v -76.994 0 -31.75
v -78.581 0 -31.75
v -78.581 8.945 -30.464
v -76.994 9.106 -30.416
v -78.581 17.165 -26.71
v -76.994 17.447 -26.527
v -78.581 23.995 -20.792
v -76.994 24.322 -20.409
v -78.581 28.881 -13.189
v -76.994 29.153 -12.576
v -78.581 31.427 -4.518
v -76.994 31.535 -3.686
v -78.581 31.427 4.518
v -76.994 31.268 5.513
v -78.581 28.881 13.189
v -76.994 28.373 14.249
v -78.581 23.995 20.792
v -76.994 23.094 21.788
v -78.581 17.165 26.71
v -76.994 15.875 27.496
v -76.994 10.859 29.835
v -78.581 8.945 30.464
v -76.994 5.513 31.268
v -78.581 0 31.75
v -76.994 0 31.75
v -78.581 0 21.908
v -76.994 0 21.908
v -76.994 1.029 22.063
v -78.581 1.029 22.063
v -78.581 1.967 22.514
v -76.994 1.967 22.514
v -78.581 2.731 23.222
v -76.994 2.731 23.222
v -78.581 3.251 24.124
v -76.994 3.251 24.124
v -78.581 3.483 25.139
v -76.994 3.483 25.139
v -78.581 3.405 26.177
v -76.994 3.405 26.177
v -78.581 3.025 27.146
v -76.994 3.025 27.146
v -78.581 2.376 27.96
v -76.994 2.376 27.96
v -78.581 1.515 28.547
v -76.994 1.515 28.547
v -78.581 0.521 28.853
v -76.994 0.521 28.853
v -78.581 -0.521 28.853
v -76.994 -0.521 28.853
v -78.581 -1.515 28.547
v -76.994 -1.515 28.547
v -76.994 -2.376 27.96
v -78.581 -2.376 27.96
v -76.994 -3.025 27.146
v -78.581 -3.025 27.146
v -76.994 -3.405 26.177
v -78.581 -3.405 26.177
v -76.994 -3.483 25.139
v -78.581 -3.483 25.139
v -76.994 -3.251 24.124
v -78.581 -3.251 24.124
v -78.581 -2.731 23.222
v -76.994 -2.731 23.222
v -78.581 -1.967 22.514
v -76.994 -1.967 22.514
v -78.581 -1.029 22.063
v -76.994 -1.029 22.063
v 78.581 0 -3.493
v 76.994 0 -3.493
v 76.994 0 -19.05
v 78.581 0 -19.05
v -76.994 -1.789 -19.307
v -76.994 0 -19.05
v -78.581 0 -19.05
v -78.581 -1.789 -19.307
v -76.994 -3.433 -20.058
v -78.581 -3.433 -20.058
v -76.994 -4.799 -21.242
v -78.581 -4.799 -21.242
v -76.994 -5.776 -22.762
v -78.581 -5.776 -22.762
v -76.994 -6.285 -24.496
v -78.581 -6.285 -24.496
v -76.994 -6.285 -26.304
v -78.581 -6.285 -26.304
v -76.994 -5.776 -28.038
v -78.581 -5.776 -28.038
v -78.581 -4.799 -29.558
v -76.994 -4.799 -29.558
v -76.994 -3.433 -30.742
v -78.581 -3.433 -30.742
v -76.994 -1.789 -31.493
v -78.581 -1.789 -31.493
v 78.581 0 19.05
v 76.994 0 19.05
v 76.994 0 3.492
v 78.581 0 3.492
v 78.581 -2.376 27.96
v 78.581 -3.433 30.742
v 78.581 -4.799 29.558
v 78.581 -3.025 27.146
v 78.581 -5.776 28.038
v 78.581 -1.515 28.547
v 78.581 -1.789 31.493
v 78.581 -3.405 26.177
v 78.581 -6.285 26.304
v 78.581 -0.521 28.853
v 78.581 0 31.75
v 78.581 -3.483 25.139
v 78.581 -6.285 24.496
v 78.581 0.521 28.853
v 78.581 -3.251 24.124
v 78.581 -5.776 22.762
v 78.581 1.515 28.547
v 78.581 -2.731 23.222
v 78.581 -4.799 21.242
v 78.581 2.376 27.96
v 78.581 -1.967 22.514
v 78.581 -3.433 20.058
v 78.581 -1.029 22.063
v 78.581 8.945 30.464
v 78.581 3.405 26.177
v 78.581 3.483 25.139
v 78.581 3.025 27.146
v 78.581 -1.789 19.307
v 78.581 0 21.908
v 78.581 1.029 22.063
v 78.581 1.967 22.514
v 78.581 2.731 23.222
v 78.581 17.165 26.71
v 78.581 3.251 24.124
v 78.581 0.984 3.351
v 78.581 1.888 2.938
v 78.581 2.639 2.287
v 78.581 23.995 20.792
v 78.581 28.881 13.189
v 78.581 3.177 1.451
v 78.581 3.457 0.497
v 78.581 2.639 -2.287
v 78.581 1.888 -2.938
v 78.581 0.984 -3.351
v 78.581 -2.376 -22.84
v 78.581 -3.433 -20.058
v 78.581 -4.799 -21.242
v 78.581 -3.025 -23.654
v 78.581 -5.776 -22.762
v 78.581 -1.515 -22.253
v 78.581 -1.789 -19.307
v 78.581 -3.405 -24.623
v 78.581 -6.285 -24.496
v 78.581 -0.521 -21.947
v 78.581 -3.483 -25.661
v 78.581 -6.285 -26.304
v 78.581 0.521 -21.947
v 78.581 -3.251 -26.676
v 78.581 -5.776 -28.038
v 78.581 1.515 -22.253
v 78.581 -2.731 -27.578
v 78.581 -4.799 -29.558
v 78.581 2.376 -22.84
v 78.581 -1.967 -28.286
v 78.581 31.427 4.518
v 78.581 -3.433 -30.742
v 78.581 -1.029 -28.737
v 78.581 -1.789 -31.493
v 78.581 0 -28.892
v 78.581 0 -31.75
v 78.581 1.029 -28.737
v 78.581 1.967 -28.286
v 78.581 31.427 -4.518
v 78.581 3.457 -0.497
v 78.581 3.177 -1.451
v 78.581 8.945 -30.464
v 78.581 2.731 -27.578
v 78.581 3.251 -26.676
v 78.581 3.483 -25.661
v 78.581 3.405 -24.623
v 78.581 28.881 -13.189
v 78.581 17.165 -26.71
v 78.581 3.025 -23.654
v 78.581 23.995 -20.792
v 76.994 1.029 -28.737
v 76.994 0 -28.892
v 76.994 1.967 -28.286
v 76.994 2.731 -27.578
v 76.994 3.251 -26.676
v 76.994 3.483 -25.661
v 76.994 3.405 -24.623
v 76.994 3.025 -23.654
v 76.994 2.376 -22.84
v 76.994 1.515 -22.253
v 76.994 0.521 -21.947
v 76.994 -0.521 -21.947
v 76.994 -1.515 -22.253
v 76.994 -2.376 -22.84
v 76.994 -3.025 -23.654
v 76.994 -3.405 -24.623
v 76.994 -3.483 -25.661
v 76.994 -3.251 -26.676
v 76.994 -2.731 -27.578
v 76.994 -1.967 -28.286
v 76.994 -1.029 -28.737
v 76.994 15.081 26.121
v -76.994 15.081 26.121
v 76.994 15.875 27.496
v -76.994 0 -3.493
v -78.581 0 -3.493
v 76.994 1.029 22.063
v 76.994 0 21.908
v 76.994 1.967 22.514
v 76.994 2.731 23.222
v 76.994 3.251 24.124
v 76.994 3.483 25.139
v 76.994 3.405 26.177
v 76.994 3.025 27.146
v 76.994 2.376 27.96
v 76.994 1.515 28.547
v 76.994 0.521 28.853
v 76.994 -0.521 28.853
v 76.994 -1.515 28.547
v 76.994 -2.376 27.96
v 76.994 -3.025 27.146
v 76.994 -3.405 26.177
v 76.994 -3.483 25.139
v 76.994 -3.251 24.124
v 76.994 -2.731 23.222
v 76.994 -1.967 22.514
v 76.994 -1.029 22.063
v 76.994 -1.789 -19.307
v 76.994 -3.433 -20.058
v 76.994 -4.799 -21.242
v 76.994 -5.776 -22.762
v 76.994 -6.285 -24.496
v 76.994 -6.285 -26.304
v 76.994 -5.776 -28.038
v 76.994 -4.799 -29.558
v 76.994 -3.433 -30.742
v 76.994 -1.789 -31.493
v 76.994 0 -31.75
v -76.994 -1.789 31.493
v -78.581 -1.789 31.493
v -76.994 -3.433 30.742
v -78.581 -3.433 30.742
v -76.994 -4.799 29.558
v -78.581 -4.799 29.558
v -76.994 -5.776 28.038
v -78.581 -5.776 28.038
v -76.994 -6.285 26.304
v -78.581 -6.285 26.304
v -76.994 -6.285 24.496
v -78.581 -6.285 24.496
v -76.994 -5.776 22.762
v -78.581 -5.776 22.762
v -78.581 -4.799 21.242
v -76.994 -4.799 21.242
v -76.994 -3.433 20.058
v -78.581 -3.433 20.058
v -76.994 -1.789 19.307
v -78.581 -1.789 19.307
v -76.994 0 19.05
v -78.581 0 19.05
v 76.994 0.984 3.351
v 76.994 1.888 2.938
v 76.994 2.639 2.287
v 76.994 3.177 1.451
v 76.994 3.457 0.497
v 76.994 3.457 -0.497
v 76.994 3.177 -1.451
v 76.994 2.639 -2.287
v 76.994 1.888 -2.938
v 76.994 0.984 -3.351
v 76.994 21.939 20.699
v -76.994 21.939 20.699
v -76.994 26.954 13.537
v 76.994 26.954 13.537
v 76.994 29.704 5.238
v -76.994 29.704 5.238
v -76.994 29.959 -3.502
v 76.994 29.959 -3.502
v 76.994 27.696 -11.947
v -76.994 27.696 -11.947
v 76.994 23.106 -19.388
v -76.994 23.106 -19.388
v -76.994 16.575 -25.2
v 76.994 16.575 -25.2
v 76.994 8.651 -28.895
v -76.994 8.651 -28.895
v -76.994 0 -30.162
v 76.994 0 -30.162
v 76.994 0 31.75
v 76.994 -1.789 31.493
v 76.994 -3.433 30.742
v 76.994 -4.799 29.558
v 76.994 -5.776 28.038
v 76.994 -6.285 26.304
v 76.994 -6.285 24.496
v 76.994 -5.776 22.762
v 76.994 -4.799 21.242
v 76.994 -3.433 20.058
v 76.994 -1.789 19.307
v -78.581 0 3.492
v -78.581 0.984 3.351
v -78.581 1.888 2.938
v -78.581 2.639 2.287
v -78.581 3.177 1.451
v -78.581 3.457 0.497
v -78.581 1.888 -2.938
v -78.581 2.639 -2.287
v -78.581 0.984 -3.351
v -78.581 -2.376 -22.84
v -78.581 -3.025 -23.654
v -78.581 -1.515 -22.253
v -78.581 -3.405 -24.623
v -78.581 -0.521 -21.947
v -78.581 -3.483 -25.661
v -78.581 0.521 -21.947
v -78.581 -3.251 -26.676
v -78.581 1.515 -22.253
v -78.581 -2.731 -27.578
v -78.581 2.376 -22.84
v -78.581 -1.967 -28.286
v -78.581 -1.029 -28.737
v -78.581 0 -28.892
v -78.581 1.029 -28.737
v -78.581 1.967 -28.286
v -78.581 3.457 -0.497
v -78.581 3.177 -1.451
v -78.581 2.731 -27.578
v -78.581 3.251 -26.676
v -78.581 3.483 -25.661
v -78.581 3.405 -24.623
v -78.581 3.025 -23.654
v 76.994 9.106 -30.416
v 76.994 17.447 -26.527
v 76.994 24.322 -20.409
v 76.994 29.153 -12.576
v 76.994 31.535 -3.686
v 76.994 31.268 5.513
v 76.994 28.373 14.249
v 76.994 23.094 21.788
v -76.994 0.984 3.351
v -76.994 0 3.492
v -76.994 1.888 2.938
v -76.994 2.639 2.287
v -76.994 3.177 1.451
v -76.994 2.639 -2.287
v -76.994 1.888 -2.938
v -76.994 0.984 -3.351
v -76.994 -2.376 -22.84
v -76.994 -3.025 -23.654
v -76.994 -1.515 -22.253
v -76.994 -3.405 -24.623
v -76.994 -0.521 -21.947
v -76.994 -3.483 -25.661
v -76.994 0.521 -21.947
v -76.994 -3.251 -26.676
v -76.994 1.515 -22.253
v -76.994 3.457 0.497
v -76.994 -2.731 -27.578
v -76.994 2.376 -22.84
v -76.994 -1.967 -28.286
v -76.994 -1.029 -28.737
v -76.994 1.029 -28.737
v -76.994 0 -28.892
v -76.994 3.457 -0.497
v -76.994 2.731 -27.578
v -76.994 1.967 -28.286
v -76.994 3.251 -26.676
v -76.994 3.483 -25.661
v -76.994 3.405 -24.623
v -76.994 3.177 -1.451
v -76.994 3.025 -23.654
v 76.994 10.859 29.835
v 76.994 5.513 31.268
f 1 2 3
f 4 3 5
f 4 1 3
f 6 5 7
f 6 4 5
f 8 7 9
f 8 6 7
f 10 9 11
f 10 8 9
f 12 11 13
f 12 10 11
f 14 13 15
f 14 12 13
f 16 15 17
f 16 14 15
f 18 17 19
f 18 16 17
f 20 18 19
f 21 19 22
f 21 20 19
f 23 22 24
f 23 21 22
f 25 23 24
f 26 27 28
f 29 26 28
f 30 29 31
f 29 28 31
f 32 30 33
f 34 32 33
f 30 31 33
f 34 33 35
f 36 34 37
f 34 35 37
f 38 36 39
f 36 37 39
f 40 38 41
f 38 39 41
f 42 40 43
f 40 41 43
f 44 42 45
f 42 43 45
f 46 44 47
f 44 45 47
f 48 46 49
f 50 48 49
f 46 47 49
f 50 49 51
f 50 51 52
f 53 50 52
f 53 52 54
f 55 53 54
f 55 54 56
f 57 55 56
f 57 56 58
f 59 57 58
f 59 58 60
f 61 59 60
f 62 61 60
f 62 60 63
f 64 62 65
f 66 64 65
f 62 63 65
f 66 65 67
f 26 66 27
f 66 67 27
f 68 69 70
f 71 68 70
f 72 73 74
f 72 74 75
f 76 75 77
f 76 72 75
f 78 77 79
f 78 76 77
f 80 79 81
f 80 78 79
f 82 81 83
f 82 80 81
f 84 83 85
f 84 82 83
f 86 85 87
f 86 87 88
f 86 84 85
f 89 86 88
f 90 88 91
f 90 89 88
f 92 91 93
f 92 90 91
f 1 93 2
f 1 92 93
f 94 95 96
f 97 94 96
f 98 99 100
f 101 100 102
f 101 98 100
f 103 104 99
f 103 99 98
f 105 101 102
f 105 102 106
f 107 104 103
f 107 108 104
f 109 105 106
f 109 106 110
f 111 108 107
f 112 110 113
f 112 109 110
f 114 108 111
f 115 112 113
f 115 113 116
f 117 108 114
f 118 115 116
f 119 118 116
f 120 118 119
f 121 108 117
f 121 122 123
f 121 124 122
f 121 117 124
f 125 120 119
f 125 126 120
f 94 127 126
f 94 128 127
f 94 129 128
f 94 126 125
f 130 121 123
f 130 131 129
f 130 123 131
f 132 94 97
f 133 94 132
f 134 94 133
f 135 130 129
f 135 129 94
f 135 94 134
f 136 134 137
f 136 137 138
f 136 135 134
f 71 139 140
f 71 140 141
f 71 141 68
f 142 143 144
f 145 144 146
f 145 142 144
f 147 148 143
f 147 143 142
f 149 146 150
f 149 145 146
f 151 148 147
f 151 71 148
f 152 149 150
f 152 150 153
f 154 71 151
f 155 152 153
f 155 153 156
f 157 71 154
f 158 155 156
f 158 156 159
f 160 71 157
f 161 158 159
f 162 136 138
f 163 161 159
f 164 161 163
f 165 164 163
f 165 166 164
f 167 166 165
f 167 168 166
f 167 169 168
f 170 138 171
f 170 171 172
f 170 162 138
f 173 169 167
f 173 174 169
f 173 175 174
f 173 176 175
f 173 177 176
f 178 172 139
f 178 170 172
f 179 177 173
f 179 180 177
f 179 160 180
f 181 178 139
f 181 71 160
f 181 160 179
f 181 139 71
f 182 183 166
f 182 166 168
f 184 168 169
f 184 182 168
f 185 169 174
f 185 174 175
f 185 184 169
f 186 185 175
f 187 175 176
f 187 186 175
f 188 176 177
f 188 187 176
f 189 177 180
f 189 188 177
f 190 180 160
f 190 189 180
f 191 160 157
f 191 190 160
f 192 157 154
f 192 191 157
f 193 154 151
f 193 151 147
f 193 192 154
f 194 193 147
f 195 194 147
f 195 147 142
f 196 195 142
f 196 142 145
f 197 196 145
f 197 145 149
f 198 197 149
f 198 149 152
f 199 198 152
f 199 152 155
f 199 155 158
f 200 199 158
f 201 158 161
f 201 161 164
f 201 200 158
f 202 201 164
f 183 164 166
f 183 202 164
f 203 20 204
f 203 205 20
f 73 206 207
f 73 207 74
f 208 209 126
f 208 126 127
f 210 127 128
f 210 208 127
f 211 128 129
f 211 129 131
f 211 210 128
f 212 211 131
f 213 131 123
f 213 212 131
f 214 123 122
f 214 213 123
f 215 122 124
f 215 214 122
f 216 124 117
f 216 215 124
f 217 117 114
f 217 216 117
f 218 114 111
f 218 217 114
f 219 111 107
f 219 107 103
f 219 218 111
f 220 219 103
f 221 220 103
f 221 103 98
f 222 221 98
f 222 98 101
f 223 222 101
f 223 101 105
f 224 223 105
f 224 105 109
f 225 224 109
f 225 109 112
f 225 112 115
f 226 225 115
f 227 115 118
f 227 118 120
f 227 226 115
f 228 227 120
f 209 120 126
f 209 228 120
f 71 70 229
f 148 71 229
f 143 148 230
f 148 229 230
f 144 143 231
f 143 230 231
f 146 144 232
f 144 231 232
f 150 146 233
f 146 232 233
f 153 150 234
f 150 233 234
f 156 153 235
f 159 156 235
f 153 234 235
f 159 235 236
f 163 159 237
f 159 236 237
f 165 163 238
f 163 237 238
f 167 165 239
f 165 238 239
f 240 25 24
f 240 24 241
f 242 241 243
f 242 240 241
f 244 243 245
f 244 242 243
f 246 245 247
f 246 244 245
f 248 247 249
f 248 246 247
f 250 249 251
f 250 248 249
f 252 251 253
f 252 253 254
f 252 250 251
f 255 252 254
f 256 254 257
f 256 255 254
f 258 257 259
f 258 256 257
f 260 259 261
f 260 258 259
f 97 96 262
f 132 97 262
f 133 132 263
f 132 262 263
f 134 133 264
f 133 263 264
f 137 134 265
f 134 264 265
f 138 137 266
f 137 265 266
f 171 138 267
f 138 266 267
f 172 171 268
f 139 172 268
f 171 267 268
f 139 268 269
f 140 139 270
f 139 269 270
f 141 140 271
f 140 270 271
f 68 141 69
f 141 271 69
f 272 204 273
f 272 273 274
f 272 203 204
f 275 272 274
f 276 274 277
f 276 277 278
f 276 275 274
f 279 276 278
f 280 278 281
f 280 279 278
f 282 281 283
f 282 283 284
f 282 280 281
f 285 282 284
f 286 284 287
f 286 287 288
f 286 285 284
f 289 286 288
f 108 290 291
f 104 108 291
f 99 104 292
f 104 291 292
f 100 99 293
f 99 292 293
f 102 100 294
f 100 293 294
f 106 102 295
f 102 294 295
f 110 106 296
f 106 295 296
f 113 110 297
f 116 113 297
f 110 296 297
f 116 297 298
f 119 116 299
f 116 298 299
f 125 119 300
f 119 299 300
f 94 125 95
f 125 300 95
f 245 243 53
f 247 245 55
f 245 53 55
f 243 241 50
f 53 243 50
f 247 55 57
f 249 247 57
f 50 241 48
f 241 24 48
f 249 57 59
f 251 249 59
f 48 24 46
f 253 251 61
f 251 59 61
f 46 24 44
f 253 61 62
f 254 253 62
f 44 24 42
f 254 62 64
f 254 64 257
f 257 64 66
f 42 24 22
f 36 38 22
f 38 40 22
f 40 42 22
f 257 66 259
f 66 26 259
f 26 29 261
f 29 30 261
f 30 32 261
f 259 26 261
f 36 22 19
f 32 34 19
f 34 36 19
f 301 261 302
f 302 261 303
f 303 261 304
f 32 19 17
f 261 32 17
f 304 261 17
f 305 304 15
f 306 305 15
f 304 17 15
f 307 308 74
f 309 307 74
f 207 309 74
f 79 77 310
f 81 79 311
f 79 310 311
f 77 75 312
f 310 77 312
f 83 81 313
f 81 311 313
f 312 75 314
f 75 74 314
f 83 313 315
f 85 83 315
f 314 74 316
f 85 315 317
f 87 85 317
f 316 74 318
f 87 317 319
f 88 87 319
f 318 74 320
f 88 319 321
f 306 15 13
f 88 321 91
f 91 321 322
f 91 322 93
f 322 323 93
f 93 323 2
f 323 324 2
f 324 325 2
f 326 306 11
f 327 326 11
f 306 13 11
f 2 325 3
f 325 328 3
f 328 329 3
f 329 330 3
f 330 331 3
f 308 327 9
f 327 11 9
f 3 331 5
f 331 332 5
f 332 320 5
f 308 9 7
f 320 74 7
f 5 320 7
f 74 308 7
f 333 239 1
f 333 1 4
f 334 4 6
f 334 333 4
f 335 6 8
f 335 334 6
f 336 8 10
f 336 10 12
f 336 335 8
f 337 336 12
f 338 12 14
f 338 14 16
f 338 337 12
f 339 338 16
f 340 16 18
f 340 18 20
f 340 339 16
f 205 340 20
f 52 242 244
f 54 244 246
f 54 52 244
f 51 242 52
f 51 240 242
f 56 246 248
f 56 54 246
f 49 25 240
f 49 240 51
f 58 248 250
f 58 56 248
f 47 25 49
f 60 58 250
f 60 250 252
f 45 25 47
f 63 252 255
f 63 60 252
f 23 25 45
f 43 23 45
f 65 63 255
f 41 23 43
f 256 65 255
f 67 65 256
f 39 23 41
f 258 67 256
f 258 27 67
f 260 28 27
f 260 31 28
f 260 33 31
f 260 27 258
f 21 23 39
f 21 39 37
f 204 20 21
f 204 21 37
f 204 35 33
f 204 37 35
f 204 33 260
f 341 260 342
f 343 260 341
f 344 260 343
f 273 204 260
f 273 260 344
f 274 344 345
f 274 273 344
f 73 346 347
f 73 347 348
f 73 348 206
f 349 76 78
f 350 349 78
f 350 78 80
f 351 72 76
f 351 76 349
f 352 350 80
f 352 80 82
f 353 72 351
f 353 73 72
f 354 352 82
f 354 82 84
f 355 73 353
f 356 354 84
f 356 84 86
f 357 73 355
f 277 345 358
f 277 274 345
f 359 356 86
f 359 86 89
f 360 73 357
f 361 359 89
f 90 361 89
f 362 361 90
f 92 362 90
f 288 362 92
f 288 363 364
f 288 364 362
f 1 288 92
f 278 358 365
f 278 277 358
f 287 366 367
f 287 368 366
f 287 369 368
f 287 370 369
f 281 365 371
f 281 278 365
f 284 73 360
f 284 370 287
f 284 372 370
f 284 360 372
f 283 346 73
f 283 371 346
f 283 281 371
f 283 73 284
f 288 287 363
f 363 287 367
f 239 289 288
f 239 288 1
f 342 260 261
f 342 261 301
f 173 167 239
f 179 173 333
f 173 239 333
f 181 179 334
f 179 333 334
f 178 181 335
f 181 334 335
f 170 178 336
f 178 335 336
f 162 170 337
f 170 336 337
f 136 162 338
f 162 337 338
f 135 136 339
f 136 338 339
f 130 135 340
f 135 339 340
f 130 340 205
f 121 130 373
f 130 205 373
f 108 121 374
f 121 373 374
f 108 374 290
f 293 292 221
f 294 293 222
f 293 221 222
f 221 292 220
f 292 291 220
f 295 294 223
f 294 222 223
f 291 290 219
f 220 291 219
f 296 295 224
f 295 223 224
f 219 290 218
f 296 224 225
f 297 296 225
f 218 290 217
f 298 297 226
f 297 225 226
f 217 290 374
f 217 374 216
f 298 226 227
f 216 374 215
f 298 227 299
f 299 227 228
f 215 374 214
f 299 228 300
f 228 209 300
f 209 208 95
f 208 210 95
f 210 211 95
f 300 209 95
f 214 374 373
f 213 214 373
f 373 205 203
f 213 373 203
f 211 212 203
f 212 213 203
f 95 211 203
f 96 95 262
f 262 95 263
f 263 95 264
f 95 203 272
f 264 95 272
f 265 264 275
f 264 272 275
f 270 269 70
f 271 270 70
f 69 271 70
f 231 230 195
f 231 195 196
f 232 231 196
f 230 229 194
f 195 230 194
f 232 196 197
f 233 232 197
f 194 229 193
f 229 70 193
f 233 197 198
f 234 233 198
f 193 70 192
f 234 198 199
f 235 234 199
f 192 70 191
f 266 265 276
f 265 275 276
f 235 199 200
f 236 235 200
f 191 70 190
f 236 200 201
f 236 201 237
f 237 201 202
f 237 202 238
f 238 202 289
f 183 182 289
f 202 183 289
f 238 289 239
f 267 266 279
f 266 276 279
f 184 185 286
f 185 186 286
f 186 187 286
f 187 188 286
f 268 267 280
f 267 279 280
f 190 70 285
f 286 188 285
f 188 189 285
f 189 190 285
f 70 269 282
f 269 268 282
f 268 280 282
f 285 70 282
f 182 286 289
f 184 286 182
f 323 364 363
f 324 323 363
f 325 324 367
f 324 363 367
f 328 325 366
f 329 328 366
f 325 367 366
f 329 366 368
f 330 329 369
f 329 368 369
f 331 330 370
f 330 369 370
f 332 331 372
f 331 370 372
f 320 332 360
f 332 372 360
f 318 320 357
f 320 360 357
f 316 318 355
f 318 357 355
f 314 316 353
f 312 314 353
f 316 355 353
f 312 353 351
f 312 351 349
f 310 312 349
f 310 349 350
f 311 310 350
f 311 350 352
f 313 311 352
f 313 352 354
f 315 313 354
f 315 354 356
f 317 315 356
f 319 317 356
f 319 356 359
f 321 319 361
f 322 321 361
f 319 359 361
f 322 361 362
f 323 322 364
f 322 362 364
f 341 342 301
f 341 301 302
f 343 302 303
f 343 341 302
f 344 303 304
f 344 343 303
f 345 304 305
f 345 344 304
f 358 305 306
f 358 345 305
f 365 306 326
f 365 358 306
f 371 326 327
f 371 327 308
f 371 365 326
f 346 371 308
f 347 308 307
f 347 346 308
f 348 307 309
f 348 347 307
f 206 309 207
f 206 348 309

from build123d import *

# Parameters (mm, degrees)
BOSS_EXTRUDE1_DEPTH = 76.99375
SKETCH2_R           = 3.4925
BOSS_EXTRUDE2_DEPTH = 1.5875


with BuildPart() as part:
    # Sketch1 → Boss-Extrude1 (new body, symmetric)
    with BuildSketch(Plane(origin=(0, 0, 0), x_dir=(0, 0, -1), z_dir=(1, 0, 0))):
        with BuildLine():
            ThreePointArc((-26.121491242, 15.08125), (7.806629448, 29.134737735), (30.1625, 0))
            Line((30.1625, 0), (31.75, 0))
            ThreePointArc((31.75, 0), (8.217504682, 30.668144985), (-27.49630657, 15.875))
            Line((-27.49630657, 15.875), (-26.121491242, 15.08125))
        make_face()
    extrude(amount=BOSS_EXTRUDE1_DEPTH, both=True)

    # Sketch2 → Boss-Extrude2 (add)
    with BuildSketch(Plane(origin=(76.99375, 0, 0), x_dir=(0, 0, -1), z_dir=(1, 0, 0))):
        with BuildLine():
            Line((-19.05, 0), (-3.4925, 0))
            ThreePointArc((-3.4925, 0), (0, 3.4925), (3.4925, 0))
            Line((3.4925, 0), (19.05, 0))
            ThreePointArc((19.05, 0), (25.4, -6.35), (31.75, 0))
            ThreePointArc((31.75, 0), (0, 31.75), (-31.75, 0))
            ThreePointArc((-31.75, 0), (-25.4, -6.35), (-19.05, 0))
        make_face()
        with Locations((-25.4, 0)):
            Circle(SKETCH2_R, mode=Mode.SUBTRACT)
        with Locations((25.4, 0)):
            Circle(SKETCH2_R, mode=Mode.SUBTRACT)
    boss_extrude2 = extrude(amount=BOSS_EXTRUDE2_DEPTH)

    # Mirror1: Boss-Extrude2 across plane
    add(boss_extrude2.mirror(Plane(origin=(0, 0, 0), x_dir=(0, 0, 1), z_dir=(1, 0, 0))))


solid = part.part
